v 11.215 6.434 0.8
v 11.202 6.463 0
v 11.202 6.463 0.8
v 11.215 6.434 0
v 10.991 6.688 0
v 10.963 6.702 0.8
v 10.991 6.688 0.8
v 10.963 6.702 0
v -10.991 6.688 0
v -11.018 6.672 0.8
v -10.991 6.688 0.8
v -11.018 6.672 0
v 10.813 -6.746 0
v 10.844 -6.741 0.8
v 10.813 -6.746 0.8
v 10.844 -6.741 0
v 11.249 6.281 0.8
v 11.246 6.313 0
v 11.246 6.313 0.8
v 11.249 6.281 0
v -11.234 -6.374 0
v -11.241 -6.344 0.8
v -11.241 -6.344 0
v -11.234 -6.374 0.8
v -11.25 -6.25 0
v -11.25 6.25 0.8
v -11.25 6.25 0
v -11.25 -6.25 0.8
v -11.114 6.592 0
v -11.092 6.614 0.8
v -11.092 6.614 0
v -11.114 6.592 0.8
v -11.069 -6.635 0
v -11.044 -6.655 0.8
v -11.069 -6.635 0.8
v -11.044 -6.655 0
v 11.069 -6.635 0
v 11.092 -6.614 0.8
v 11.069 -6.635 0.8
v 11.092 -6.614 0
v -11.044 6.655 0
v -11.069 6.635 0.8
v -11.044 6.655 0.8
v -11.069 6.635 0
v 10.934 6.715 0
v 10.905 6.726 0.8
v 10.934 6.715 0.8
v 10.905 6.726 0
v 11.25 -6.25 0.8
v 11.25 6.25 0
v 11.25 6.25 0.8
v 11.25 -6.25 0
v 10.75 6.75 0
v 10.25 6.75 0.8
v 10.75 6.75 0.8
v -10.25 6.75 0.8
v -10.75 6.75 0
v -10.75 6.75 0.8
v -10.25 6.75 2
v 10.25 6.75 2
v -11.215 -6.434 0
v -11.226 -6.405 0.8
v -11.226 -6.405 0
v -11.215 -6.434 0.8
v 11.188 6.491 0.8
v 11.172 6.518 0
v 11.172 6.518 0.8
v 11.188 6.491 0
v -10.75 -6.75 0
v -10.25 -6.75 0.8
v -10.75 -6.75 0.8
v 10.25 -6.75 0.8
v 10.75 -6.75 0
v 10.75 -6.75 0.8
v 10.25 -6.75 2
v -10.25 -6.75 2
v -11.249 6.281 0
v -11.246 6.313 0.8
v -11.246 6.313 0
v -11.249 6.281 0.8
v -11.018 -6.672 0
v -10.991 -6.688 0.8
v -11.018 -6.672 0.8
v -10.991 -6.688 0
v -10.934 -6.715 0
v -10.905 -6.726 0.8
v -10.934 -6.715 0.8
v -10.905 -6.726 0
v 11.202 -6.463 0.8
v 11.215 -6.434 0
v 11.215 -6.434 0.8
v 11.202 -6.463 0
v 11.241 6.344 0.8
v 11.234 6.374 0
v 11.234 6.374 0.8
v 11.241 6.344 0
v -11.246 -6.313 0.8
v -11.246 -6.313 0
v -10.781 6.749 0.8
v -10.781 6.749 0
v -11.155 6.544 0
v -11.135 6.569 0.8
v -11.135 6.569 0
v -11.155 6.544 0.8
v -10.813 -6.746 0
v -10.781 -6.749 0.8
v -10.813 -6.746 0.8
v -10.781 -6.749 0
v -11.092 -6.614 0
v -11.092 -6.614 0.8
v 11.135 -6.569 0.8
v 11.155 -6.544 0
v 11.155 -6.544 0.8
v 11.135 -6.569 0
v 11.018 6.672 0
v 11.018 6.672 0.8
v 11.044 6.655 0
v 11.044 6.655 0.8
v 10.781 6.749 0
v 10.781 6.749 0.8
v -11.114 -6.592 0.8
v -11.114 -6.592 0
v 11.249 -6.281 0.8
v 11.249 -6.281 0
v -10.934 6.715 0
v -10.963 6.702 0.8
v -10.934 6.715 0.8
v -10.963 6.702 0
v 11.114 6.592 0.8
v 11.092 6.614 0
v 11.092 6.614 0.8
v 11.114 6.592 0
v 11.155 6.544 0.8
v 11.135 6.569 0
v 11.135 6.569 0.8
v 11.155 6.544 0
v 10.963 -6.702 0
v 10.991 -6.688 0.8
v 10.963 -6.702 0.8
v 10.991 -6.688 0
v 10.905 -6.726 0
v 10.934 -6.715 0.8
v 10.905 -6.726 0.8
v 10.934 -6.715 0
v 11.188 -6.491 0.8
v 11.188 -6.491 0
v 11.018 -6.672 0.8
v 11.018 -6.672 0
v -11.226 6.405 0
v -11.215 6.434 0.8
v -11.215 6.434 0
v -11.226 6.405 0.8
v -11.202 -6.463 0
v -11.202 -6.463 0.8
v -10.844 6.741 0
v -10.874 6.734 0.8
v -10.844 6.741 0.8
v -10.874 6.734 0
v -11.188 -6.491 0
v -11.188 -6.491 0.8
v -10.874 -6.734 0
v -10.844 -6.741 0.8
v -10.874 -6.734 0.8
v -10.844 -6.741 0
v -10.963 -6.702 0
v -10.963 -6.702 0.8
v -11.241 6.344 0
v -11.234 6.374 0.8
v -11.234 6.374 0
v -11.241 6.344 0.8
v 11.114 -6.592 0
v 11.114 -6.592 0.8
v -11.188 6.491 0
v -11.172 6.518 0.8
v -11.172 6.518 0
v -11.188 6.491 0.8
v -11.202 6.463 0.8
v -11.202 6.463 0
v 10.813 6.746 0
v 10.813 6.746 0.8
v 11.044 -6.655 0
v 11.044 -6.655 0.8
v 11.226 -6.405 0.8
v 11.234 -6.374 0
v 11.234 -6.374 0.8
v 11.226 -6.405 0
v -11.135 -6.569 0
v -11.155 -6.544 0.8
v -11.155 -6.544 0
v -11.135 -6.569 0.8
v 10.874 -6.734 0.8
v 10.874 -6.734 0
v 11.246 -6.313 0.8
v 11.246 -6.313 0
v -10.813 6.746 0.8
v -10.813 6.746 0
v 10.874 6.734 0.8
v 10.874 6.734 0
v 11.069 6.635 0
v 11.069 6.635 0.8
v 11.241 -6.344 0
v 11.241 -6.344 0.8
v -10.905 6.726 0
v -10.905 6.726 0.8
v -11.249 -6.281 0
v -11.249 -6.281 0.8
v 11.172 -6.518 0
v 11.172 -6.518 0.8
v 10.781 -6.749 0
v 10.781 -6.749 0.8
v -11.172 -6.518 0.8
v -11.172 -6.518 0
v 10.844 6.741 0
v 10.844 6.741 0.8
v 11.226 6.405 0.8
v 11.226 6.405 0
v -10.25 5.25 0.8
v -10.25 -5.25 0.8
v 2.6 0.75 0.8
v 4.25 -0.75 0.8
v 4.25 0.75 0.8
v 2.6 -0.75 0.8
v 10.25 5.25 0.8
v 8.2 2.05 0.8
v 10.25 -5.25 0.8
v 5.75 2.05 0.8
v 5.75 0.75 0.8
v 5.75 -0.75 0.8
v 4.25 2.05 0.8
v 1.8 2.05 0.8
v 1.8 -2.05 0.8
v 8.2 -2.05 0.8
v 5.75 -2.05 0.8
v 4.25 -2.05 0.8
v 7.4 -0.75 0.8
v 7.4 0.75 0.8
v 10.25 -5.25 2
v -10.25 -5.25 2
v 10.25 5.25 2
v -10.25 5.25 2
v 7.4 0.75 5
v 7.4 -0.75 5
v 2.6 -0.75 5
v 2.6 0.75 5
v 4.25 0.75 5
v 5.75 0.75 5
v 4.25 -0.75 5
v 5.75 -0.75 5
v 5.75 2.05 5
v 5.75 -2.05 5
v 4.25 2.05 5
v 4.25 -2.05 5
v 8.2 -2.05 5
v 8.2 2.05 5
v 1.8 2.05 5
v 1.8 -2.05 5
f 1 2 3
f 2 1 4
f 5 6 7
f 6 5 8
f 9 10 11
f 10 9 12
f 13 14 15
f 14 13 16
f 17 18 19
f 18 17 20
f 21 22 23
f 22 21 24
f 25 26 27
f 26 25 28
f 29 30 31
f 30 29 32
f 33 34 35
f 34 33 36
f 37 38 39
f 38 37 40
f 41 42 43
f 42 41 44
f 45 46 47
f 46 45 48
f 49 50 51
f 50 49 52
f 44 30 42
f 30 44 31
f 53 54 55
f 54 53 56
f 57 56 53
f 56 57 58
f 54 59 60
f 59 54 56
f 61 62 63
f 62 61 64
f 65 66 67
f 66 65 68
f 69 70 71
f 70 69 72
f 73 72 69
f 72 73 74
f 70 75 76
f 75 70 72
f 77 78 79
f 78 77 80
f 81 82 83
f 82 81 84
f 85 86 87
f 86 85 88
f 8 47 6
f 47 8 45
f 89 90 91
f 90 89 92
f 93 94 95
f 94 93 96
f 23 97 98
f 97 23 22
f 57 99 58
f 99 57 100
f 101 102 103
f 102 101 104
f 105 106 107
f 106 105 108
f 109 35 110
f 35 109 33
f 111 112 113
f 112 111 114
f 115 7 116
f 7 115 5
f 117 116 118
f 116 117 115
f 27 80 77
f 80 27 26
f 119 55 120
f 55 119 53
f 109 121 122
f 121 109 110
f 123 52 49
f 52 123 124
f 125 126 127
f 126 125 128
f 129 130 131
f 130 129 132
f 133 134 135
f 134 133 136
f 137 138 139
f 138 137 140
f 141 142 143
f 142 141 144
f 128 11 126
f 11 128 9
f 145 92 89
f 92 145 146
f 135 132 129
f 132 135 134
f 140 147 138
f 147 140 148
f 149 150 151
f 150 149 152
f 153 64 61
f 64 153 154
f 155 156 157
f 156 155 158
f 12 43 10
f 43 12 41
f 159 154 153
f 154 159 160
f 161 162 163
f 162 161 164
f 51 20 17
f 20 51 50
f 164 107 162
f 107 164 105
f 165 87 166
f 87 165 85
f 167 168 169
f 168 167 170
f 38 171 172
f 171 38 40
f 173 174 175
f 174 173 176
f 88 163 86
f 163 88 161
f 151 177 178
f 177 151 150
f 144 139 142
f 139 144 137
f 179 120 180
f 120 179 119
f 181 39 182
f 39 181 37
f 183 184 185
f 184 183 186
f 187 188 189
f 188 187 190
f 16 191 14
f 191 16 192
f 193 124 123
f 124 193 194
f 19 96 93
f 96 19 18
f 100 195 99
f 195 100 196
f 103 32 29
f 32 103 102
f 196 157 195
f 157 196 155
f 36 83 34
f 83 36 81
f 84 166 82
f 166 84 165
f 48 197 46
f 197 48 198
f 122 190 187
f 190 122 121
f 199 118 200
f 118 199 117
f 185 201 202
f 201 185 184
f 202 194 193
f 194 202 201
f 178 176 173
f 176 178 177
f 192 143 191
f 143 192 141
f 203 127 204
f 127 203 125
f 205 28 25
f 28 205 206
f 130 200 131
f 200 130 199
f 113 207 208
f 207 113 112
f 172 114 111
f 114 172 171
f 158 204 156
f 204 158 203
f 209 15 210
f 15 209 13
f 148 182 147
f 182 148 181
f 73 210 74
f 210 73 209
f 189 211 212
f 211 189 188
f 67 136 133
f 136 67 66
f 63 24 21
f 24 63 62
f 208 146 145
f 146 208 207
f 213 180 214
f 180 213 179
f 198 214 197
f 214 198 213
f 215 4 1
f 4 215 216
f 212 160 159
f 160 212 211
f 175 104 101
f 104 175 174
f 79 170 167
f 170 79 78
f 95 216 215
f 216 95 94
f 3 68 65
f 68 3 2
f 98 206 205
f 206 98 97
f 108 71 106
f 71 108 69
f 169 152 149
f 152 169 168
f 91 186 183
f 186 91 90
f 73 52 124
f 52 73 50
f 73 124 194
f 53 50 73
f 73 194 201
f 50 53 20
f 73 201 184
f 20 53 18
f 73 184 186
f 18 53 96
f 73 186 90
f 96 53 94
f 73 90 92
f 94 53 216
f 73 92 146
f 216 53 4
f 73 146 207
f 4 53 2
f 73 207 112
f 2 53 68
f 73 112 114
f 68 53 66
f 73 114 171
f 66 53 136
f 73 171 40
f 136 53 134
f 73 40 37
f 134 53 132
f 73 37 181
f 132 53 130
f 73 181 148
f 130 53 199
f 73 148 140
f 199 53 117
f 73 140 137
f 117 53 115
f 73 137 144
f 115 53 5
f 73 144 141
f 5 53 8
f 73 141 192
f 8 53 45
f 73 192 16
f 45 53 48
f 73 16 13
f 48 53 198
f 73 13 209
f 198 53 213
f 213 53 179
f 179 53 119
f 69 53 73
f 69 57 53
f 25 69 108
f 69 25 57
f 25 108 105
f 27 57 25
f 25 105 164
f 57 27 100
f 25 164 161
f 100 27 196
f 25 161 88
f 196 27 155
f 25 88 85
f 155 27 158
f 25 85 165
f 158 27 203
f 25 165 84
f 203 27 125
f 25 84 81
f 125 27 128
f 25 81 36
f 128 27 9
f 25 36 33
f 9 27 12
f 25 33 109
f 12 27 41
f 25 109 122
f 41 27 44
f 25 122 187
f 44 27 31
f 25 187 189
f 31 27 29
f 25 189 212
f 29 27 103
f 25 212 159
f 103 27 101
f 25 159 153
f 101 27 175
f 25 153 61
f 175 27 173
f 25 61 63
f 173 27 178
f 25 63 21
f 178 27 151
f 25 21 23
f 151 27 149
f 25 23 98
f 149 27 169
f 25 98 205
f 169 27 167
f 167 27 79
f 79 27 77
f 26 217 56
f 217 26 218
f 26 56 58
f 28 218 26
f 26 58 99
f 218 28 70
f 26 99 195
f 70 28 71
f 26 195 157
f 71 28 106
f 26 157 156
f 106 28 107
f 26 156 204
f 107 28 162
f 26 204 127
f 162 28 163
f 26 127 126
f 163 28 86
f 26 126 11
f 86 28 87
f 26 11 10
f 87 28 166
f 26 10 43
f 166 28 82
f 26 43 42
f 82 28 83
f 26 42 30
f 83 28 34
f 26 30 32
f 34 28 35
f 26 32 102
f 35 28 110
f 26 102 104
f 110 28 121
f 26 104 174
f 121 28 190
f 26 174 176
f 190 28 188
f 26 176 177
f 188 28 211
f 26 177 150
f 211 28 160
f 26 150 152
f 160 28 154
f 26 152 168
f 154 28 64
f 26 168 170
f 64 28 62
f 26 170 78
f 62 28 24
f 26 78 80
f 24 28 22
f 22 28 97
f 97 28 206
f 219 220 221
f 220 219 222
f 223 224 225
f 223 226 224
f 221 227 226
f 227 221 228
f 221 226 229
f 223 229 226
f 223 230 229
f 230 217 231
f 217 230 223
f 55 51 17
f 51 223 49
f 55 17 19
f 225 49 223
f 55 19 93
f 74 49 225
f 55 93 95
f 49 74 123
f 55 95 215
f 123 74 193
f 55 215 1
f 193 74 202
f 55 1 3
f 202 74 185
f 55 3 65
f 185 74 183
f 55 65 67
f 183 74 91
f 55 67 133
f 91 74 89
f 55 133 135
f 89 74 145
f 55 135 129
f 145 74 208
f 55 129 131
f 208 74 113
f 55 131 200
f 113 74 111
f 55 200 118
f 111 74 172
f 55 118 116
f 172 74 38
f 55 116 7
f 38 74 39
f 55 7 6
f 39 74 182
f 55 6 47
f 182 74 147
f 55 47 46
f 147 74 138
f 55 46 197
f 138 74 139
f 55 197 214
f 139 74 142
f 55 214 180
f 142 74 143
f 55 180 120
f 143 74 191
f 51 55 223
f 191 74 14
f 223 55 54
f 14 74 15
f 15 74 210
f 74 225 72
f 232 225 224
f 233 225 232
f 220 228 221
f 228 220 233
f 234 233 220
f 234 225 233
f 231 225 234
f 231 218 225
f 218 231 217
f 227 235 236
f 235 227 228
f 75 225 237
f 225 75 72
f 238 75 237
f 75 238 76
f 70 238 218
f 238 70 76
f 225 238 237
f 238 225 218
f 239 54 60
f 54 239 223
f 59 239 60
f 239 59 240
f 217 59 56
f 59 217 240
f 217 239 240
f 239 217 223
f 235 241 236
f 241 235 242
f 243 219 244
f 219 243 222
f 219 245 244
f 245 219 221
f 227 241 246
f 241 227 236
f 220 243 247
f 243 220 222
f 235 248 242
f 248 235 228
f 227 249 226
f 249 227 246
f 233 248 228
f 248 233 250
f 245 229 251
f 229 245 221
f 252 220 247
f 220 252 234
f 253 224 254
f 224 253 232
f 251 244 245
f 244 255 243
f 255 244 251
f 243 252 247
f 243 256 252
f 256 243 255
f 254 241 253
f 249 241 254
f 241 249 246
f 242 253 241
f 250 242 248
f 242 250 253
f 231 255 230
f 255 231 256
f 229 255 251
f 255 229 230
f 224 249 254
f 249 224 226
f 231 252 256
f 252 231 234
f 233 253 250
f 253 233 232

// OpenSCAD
base_x = 22.5;
base_y = 13.5;
base_h = 0.8;

base_hole_r = 5.5 / 2;

stem_shift = 5;

stem_cutout_x = 4.1;
stem_cutout_y = 1.5;
stem_cutout_x_margin = 0.7;

stem_h = 5;

rounding_r = 0.5;

epsilon = 0.01;


module base()
{
    translate([-base_x / 2, -base_y / 2, 0])
    {
        intersection()
        {
            translate([rounding_r, rounding_r, 0]) minkowski()
            {
                cube([base_x - 2 * rounding_r, base_y - 2 * rounding_r, base_h]);
                cylinder(base_h, rounding_r, rounding_r);
            }
            
            cube([base_x, base_y, base_h]); 
        }
    }
}

module reinforcements()
{
    translate([-base_x / 2 + 1, -base_y / 2, 0])
    {
        cube([base_x - 2, 1.5, 2]);
    }
    
        translate([-base_x / 2 + 1, base_y / 2 - 1.5, 0])
    {
        cube([base_x - 2, 1.5, 2]);
    }
}

module stem_cutout()
{
    translate([stem_shift, 0, 0]) union()
    {
        translate([-stem_cutout_x / 2 -stem_cutout_x_margin / 2, - stem_cutout_y / 2, - epsilon])
        {
            cube([stem_cutout_x + stem_cutout_x_margin, stem_cutout_y, stem_h + epsilon * 2]);        
        }

        translate([-stem_cutout_y / 2, -stem_cutout_x / 2 -stem_cutout_x_margin / 2, - epsilon])
        {
            cube([stem_cutout_y, stem_cutout_x + stem_cutout_x_margin, stem_h + epsilon * 2]);        
        }    
    }  
}

module stem()
{
    translate([stem_shift - (stem_cutout_x + stem_cutout_x_margin) / 2 - 0.8, - stem_cutout_x / 2, 0])
    {
        cube([stem_cutout_x + stem_cutout_x_margin + 1.6, stem_cutout_x, stem_h]);  
    }
}

module adapter()
{
    $fn = 100;
 
    union()
    {
        base();
        reinforcements();
        difference()
        {
            stem();
            stem_cutout(); 
        }
    }
}

adapter();
